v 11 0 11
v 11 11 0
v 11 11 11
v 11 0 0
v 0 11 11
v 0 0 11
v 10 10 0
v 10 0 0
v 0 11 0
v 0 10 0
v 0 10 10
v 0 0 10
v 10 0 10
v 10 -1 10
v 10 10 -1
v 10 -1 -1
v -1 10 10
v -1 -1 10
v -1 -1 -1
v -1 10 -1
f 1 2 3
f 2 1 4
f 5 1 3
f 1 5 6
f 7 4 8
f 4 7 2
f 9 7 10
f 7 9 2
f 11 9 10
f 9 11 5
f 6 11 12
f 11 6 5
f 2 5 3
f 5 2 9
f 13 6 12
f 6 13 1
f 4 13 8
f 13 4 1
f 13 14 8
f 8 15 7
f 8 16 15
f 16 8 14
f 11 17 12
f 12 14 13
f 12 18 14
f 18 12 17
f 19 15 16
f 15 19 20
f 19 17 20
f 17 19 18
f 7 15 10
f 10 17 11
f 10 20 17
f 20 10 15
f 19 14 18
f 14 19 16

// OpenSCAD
// Unit of length: Unit.MM
union()
{
   color(c = [1.0, 0.0, 0.0, 1.0])
   {
      cube(size = 11.0, center = false);
   }
   translate(v = [-1.0, -1.0, -1.0])
   {
      cube(size = 11.0, center = false);
   }
}
